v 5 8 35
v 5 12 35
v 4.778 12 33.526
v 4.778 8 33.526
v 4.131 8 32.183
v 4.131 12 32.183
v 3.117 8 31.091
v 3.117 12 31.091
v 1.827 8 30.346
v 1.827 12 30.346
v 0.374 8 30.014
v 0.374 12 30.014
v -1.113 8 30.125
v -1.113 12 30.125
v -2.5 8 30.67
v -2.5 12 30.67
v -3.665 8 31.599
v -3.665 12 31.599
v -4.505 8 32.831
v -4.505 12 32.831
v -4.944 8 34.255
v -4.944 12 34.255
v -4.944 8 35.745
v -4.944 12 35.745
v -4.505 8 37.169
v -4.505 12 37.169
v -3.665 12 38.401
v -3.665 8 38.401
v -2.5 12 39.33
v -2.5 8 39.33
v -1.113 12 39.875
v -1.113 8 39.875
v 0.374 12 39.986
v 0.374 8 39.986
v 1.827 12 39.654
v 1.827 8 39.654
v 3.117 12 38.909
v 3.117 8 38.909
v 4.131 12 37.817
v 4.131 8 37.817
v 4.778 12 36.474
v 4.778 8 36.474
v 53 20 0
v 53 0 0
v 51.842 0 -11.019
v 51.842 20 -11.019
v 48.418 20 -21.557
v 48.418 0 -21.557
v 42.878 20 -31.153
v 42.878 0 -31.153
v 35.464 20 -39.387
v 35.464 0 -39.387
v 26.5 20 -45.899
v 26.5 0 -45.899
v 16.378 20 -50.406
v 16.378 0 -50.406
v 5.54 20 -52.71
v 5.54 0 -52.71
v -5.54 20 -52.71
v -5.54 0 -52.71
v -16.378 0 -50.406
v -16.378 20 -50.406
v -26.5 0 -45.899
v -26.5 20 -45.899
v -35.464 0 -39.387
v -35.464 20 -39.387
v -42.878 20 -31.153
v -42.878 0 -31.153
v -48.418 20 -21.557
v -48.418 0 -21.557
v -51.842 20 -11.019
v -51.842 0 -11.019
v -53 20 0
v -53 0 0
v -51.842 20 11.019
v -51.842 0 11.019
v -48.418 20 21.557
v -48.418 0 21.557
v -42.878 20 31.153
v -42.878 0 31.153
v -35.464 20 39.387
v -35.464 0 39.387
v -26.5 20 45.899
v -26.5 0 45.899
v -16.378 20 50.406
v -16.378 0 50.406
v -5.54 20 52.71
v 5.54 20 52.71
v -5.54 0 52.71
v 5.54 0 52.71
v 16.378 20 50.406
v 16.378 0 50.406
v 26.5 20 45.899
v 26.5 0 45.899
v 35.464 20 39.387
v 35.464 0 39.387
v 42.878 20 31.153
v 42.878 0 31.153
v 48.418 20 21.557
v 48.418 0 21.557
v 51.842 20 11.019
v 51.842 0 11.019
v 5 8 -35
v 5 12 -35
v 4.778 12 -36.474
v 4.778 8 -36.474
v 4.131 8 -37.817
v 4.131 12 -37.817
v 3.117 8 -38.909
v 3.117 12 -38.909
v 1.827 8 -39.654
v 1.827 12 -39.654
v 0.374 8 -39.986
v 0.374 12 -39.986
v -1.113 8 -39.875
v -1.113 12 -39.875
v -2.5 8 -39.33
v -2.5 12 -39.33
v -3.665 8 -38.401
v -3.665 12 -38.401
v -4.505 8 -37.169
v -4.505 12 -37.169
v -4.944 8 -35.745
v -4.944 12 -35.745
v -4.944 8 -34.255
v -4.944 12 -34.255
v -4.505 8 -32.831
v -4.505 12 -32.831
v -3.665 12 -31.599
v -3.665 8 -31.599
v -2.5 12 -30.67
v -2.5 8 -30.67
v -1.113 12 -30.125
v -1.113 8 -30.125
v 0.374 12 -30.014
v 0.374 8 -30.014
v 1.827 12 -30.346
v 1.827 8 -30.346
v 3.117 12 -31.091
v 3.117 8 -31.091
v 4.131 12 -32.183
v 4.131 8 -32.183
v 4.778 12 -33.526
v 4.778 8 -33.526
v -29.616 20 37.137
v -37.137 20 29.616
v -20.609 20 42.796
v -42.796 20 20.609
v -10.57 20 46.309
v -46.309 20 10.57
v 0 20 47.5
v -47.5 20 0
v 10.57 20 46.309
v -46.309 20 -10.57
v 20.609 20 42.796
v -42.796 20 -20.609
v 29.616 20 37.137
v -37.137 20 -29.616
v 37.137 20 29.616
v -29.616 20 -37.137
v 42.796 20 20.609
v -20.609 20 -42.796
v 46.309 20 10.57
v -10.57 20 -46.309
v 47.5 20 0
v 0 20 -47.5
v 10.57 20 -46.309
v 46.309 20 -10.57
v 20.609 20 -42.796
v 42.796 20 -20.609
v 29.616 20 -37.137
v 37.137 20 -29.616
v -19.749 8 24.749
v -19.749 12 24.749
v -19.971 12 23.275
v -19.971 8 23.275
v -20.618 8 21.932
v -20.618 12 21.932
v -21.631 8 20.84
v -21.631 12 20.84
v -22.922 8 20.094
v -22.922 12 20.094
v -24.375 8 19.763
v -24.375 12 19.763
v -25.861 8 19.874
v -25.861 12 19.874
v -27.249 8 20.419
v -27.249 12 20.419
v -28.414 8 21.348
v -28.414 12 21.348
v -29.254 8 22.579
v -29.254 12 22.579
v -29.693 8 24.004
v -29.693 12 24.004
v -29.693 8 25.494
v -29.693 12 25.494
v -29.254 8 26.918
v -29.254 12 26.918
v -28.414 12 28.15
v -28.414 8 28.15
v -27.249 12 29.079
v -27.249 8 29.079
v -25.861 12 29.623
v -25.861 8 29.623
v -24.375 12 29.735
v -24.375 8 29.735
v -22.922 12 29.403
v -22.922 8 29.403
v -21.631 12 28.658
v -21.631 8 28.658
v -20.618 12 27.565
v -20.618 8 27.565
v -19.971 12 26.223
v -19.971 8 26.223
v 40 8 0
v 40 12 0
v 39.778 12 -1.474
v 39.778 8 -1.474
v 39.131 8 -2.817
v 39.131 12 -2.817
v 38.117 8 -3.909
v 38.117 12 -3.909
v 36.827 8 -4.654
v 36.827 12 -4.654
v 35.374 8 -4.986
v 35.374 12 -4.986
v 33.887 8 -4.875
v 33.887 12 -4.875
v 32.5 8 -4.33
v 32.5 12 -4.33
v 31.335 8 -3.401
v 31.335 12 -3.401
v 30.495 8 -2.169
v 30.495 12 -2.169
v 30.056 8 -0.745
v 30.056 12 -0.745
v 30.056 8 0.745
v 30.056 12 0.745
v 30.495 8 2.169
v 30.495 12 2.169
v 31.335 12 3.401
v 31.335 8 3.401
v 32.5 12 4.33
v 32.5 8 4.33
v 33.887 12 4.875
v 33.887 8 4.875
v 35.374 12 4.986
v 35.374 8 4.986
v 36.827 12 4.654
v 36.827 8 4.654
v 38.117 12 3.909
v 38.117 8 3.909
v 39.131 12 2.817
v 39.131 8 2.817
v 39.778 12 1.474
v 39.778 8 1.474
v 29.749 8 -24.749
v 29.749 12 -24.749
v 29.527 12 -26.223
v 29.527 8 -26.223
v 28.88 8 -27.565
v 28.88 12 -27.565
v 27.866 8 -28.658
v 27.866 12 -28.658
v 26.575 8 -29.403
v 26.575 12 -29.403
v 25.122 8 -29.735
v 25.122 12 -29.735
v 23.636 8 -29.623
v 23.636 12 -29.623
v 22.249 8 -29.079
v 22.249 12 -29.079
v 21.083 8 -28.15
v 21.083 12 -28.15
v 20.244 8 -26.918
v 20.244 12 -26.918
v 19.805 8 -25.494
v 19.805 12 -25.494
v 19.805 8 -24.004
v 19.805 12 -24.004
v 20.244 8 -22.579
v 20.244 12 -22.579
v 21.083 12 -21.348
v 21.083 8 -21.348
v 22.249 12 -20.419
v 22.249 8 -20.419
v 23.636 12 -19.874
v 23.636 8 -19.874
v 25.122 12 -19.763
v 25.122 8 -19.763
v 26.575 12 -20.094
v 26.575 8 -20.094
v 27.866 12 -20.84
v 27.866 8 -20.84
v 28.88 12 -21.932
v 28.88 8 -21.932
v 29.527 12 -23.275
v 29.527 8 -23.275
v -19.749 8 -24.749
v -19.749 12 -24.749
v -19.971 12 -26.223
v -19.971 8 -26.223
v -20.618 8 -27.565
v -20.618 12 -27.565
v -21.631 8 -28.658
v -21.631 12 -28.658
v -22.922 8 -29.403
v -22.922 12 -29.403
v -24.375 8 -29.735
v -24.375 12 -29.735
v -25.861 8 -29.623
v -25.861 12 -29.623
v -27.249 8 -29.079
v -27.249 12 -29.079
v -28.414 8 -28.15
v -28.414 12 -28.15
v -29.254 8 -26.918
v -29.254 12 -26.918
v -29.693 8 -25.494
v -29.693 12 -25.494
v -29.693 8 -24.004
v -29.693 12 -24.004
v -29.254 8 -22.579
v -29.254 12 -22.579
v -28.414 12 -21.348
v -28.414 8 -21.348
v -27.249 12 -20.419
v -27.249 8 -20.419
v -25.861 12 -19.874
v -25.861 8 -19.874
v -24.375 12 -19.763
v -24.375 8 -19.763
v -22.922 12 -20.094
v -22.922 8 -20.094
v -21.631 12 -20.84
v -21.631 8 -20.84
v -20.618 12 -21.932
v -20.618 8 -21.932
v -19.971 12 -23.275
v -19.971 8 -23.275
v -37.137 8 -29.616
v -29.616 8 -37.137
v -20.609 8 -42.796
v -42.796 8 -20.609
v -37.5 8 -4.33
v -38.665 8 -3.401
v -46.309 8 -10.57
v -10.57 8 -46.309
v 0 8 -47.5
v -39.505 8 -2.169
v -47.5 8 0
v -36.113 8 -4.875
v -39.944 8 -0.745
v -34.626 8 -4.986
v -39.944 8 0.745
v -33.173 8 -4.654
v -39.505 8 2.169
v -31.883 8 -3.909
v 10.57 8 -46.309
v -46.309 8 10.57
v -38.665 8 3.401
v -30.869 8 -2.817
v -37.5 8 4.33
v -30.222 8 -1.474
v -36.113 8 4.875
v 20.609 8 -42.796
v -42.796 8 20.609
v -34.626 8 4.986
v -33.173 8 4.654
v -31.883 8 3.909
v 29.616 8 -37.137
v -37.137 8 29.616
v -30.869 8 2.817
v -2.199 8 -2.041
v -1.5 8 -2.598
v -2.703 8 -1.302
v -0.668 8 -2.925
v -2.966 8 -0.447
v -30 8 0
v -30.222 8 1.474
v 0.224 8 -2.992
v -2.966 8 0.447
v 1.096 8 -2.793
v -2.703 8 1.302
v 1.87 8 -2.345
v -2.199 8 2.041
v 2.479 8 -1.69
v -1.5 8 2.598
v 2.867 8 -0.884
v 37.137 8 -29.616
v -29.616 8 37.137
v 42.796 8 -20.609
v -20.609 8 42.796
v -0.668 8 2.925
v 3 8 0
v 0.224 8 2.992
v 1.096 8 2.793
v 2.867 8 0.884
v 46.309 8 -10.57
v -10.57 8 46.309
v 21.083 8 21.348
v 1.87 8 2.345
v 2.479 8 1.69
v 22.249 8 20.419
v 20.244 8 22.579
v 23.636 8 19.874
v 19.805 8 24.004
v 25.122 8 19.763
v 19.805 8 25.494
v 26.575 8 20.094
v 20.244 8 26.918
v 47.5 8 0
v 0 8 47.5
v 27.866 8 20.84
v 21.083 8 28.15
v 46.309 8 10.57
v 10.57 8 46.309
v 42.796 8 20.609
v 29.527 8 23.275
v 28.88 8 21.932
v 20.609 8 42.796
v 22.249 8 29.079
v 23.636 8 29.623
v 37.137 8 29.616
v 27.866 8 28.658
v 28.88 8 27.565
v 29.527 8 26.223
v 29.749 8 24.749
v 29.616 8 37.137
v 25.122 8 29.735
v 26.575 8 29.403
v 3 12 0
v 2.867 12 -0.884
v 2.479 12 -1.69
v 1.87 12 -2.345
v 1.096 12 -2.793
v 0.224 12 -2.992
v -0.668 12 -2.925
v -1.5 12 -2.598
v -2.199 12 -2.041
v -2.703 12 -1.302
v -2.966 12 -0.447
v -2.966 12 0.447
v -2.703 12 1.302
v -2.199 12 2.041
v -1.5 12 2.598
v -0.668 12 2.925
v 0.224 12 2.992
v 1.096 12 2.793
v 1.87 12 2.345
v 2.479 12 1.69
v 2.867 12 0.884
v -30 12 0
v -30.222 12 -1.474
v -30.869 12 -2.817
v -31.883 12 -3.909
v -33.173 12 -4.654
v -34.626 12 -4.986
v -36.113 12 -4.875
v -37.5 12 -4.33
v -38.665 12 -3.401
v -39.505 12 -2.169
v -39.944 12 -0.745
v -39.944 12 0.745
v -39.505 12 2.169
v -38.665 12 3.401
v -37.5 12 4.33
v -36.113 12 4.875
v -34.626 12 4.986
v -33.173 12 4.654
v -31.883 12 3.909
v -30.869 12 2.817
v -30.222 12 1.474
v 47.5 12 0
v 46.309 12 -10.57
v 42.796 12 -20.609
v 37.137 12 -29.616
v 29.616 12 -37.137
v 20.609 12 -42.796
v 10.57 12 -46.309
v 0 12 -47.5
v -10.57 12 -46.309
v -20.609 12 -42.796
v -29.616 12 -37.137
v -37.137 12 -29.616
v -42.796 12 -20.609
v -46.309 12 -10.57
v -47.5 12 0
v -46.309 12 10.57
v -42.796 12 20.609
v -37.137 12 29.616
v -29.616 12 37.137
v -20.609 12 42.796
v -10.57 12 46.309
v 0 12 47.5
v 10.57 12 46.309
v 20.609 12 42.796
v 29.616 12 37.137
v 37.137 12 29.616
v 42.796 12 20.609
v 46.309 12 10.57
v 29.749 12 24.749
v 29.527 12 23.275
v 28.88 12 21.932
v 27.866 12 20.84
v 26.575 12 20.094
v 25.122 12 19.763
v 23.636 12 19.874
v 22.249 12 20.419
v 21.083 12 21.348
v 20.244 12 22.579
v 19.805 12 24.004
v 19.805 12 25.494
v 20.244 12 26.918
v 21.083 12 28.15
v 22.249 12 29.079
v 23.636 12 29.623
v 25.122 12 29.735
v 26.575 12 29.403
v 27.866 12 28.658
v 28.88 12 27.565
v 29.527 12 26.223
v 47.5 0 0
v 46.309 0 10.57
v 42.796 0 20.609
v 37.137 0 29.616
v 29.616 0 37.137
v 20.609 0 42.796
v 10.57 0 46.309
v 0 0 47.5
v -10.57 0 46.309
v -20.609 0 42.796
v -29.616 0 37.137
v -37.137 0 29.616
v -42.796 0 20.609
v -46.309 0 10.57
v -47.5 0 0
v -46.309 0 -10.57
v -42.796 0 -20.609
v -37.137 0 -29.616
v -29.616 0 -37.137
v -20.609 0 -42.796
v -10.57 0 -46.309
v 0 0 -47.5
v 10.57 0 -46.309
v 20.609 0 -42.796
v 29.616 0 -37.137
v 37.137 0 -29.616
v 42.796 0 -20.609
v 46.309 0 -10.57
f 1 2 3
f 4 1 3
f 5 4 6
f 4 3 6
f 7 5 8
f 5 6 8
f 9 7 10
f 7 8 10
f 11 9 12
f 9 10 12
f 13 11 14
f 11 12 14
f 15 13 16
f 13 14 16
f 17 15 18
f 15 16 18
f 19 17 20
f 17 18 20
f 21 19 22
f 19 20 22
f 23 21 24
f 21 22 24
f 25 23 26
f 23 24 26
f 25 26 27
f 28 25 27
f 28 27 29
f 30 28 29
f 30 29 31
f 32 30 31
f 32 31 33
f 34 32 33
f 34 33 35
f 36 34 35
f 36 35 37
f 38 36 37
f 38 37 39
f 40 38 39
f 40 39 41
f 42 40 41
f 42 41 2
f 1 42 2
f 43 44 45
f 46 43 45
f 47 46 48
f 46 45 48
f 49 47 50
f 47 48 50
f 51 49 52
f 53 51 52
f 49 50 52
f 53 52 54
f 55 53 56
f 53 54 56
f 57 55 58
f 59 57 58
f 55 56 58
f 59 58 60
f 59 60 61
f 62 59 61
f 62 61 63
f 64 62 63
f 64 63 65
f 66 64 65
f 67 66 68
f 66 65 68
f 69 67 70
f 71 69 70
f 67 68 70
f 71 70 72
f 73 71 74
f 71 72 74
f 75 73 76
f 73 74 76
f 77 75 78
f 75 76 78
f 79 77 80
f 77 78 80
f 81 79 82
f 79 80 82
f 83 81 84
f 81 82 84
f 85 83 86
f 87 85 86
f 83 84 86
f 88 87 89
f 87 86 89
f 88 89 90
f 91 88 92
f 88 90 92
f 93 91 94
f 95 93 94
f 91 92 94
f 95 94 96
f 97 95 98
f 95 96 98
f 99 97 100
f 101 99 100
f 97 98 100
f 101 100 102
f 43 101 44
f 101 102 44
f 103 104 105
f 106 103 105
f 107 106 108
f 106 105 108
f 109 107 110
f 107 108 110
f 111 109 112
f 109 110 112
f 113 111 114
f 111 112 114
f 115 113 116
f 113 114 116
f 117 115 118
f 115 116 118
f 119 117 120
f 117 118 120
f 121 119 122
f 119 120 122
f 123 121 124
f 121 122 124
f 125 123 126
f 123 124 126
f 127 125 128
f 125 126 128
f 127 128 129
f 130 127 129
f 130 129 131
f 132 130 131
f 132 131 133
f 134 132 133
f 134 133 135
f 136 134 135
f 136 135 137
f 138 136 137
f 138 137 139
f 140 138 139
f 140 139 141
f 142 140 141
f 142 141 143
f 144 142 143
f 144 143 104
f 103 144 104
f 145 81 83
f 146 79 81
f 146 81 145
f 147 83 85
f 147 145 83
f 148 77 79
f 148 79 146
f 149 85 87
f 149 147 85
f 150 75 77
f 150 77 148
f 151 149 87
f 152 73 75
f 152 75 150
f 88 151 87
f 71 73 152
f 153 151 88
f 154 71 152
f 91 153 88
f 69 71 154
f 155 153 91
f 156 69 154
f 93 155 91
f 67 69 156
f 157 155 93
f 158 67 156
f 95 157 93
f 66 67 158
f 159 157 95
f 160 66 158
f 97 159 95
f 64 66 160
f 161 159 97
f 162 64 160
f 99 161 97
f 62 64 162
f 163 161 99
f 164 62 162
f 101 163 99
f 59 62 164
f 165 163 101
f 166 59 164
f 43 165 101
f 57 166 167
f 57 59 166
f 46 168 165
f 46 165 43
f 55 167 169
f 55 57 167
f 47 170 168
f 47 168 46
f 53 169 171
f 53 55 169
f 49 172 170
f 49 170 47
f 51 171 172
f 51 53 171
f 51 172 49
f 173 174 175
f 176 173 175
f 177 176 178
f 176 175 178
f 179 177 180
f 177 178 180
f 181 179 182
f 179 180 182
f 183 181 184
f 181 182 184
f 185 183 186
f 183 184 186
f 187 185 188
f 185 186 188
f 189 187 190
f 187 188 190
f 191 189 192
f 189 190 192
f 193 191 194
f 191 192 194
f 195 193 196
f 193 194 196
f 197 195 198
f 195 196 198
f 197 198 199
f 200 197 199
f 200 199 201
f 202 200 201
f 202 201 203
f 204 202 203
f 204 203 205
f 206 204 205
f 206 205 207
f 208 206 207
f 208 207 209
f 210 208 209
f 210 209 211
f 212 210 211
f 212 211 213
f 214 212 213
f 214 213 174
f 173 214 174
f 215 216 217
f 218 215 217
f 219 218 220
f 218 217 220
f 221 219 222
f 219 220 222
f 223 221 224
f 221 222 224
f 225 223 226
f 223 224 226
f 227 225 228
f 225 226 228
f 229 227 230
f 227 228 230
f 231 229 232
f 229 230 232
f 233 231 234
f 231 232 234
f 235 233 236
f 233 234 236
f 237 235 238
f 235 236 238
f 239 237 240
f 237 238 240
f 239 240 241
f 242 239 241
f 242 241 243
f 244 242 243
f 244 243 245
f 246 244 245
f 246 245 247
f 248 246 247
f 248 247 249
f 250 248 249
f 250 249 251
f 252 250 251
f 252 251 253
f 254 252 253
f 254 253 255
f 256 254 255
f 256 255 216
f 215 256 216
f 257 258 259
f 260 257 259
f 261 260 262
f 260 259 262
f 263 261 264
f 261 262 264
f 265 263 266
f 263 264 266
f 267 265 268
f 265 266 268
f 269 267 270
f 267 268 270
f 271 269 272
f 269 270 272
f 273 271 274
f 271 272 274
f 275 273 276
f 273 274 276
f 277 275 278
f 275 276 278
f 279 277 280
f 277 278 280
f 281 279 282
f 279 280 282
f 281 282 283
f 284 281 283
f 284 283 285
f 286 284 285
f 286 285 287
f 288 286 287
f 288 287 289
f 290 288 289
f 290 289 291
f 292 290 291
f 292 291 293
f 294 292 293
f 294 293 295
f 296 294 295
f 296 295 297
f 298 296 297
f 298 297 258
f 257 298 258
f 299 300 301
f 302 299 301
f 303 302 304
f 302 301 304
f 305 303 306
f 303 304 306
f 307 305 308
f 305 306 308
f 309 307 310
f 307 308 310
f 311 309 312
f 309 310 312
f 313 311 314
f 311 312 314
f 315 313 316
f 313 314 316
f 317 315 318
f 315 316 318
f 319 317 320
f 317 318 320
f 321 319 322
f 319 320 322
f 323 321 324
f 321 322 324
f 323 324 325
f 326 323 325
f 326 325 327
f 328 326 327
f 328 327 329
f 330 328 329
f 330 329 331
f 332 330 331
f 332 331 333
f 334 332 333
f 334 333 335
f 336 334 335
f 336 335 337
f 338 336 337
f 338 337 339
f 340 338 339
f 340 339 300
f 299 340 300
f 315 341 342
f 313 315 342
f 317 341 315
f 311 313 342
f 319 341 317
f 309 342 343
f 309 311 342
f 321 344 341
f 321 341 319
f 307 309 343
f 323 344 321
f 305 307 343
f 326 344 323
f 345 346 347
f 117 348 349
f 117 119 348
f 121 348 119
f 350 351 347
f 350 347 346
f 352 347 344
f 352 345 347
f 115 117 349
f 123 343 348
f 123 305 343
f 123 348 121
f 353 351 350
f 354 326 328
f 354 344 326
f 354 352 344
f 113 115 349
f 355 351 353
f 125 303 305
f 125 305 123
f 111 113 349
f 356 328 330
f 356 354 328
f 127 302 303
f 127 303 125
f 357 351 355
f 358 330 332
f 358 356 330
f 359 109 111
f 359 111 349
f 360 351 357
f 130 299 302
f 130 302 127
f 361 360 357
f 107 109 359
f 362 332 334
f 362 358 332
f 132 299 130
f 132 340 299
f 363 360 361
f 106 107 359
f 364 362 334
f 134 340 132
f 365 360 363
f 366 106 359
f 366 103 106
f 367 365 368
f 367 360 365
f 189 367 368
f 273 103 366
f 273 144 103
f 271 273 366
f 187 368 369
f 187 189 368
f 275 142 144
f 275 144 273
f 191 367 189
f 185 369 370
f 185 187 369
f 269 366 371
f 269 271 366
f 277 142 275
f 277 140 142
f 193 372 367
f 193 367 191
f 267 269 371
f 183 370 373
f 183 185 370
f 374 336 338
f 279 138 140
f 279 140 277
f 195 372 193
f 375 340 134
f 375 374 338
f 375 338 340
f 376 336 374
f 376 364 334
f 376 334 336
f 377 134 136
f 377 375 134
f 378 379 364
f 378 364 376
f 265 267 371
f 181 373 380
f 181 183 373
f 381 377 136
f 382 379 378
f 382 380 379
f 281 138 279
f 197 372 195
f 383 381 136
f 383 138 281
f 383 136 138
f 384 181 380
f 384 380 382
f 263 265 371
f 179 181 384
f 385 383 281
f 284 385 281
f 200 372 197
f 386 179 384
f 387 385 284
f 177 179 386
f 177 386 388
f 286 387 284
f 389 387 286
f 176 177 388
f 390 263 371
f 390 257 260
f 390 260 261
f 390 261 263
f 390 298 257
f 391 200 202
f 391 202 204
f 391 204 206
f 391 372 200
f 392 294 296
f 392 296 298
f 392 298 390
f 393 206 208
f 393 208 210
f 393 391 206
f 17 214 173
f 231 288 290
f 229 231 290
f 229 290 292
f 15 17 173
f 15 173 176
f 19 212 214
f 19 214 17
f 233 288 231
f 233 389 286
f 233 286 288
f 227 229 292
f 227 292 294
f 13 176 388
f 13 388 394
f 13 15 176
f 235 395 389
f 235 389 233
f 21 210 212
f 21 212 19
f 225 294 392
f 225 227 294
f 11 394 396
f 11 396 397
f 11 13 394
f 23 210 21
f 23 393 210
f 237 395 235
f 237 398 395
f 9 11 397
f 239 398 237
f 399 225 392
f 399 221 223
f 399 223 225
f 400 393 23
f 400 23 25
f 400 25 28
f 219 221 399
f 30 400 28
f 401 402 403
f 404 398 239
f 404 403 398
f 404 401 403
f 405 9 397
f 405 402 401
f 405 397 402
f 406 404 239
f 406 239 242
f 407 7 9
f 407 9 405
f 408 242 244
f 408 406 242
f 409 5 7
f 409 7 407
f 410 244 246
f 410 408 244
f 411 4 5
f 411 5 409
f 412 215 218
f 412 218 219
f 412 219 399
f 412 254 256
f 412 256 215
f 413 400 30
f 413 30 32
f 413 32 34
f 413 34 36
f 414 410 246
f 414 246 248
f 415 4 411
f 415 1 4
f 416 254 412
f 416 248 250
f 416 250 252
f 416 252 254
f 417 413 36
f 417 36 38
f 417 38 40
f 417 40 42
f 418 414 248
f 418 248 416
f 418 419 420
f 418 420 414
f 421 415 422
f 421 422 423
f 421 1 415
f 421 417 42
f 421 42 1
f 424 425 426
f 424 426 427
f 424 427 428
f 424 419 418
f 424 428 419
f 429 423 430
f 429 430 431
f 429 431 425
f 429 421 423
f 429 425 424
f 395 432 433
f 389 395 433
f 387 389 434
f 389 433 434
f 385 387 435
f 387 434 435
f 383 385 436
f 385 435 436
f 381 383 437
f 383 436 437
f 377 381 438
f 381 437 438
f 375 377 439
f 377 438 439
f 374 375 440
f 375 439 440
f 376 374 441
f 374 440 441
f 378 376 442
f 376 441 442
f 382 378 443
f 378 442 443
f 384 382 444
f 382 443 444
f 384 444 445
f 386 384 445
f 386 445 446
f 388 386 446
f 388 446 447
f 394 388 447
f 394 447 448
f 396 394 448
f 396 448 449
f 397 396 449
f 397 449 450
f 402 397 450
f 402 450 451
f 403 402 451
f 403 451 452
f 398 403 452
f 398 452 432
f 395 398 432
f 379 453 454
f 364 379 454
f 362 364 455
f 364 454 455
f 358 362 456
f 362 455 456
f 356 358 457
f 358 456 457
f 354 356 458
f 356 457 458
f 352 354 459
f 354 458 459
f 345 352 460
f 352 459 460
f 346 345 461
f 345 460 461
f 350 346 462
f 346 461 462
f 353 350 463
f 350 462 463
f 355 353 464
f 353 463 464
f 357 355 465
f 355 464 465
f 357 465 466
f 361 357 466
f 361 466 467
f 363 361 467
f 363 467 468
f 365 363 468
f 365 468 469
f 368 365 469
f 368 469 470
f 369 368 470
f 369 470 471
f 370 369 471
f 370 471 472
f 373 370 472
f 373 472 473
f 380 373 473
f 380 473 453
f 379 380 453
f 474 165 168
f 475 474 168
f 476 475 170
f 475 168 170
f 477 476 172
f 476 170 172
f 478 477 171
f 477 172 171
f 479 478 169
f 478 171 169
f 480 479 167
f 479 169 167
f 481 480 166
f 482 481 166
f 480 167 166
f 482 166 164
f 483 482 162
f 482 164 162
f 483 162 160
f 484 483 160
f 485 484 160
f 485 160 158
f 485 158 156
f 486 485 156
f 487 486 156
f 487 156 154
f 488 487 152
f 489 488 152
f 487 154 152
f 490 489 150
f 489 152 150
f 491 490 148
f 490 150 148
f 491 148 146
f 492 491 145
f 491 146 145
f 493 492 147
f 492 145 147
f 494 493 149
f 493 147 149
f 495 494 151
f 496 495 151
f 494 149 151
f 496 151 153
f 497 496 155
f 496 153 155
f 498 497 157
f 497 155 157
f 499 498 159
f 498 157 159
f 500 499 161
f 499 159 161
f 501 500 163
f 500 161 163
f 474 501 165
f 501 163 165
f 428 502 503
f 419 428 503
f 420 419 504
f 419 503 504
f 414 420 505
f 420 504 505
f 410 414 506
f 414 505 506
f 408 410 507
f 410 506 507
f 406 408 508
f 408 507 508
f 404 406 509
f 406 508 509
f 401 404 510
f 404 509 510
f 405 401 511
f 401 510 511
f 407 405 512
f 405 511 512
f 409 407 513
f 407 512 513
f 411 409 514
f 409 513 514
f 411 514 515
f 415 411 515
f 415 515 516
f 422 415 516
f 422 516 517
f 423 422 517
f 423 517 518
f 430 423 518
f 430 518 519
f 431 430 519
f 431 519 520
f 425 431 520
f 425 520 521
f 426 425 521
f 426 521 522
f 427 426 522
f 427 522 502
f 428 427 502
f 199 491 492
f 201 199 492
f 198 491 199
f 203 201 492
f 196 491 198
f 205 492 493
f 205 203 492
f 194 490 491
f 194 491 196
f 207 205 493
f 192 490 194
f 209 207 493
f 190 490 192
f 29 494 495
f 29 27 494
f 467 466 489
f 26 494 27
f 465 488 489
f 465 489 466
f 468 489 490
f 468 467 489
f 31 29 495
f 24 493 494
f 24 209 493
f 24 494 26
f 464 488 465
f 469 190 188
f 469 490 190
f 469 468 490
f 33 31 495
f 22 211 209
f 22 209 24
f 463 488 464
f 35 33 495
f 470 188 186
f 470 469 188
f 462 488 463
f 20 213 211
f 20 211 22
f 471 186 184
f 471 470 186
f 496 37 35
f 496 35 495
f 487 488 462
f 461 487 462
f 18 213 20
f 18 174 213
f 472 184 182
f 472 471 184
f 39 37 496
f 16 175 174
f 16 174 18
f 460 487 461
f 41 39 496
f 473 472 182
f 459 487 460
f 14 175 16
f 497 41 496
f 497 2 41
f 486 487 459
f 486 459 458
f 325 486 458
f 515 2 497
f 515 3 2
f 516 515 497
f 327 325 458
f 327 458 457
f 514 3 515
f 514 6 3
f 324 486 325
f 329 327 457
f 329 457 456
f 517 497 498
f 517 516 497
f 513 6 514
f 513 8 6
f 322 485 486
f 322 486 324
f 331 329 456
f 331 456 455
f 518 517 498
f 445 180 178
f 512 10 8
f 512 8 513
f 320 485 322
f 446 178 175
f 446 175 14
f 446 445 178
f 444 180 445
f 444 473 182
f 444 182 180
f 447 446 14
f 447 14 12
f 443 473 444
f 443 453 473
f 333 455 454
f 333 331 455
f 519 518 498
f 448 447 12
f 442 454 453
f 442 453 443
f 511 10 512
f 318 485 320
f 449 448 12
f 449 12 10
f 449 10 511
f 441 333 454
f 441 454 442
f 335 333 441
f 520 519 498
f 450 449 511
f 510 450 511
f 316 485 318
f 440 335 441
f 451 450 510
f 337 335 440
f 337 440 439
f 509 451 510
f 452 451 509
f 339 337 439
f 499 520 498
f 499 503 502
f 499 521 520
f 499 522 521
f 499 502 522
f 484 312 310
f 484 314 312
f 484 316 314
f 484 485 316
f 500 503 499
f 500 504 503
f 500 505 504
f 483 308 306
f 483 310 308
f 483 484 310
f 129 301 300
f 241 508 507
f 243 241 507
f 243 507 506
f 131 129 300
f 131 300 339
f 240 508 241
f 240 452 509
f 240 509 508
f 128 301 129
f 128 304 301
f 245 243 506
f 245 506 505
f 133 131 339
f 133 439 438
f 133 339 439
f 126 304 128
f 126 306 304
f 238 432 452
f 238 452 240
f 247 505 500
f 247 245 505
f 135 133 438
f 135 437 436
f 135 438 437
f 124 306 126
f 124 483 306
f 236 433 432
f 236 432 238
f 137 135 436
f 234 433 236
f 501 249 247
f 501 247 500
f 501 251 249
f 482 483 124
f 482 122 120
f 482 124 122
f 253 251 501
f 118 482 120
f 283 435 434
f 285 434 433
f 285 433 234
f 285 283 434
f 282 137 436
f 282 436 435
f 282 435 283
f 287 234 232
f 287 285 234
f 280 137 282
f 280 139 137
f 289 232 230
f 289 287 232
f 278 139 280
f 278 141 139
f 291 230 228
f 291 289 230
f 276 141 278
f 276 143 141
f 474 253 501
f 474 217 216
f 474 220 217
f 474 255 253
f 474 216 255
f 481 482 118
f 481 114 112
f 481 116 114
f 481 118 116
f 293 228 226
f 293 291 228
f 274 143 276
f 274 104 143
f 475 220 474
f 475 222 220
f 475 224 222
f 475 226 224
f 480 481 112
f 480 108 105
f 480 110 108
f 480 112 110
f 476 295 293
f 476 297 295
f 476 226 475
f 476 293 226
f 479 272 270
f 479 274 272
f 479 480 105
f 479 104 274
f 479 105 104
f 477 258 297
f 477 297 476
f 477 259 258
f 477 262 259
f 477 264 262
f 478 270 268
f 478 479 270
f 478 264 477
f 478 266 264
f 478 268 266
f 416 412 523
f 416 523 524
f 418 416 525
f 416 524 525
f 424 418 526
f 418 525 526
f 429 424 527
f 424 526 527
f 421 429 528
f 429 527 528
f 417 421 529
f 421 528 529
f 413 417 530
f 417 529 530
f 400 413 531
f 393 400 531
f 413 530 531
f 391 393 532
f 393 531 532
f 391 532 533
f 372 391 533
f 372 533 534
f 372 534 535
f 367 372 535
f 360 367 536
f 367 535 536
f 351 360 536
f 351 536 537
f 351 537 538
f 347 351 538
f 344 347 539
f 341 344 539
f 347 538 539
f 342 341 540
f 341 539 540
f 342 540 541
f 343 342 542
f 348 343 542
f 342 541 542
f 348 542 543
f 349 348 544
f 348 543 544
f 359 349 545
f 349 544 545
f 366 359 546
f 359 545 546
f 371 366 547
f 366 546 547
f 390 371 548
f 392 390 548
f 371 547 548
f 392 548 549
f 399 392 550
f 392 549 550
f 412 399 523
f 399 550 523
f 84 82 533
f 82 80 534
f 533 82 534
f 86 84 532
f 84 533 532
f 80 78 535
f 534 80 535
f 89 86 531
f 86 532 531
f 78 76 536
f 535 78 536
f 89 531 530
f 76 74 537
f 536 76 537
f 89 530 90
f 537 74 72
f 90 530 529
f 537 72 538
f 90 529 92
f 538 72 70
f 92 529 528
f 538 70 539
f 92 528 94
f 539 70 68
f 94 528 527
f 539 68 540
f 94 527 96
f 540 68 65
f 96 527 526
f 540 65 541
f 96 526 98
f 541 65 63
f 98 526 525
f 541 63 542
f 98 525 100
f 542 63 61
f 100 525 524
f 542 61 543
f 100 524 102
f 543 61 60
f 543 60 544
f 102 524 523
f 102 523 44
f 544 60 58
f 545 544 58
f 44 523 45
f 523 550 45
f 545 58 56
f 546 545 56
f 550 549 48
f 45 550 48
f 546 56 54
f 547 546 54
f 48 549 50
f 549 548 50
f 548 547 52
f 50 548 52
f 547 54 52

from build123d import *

# Parameters (mm, degrees)
SKETCH1_R           = 53
SKETCH1_R_2         = 43
BOSS_EXTRUDE1_DEPTH = 20
SKETCH2_R           = 43
BOSS_EXTRUDE2_DEPTH = 20
SKETCH3_R           = 47.5
CUT_EXTRUDE1_DEPTH  = 8
SKETCH4_R           = 47.5
CUT_EXTRUDE2_DEPTH  = 8
SKETCH5_R           = 3
SKETCH5_R_2         = 5
CUT_EXTRUDE3_DEPTH  = 13


with BuildPart() as part:
    # Sketch1 → Boss-Extrude1 (new body)
    with BuildSketch(Plane(origin=(0, 0, 0), x_dir=(1, 0, 0), z_dir=(0, 1, 0))):
        Circle(SKETCH1_R)
        Circle(SKETCH1_R_2, mode=Mode.SUBTRACT)
    extrude(amount=BOSS_EXTRUDE1_DEPTH)

    # Sketch2 → Boss-Extrude2 (add)
    with BuildSketch(Plane(origin=(0, 20, 0), x_dir=(1, 0, 0), z_dir=(0, 1, 0))):
        Circle(SKETCH2_R)
    extrude(amount=-BOSS_EXTRUDE2_DEPTH)

    # Sketch3 → Cut-Extrude1 (cut)
    with BuildSketch(Plane(origin=(0, 20, 0), x_dir=(1, 0, 0), z_dir=(0, 1, 0))):
        Circle(SKETCH3_R)
    extrude(amount=-CUT_EXTRUDE1_DEPTH, mode=Mode.SUBTRACT)

    # Sketch4 → Cut-Extrude2 (cut)
    with BuildSketch(Plane.XZ):
        Circle(SKETCH4_R)
    extrude(amount=-CUT_EXTRUDE2_DEPTH, mode=Mode.SUBTRACT)

    # Sketch5 → Cut-Extrude3 (cut, through all)
    with BuildSketch(Plane(origin=(0, 12, 0), x_dir=(1, 0, 0), z_dir=(0, 1, 0))):
        Circle(SKETCH5_R)
        with Locations((0, 35)):
            Circle(SKETCH5_R_2)
        with Locations((24.748737342, 24.748737342)):
            Circle(SKETCH5_R_2)
        with Locations((35, 0)):
            Circle(SKETCH5_R_2)
        with Locations((24.748737342, -24.748737342)):
            Circle(SKETCH5_R_2)
        with Locations((0, -35)):
            Circle(SKETCH5_R_2)
        with Locations((-24.748737342, -24.748737342)):
            Circle(SKETCH5_R_2)
        with Locations((-35, 0)):
            Circle(SKETCH5_R_2)
        with Locations((-24.748737342, 24.748737342)):
            Circle(SKETCH5_R_2)
    extrude(amount=-CUT_EXTRUDE3_DEPTH, mode=Mode.SUBTRACT)


solid = part.part
